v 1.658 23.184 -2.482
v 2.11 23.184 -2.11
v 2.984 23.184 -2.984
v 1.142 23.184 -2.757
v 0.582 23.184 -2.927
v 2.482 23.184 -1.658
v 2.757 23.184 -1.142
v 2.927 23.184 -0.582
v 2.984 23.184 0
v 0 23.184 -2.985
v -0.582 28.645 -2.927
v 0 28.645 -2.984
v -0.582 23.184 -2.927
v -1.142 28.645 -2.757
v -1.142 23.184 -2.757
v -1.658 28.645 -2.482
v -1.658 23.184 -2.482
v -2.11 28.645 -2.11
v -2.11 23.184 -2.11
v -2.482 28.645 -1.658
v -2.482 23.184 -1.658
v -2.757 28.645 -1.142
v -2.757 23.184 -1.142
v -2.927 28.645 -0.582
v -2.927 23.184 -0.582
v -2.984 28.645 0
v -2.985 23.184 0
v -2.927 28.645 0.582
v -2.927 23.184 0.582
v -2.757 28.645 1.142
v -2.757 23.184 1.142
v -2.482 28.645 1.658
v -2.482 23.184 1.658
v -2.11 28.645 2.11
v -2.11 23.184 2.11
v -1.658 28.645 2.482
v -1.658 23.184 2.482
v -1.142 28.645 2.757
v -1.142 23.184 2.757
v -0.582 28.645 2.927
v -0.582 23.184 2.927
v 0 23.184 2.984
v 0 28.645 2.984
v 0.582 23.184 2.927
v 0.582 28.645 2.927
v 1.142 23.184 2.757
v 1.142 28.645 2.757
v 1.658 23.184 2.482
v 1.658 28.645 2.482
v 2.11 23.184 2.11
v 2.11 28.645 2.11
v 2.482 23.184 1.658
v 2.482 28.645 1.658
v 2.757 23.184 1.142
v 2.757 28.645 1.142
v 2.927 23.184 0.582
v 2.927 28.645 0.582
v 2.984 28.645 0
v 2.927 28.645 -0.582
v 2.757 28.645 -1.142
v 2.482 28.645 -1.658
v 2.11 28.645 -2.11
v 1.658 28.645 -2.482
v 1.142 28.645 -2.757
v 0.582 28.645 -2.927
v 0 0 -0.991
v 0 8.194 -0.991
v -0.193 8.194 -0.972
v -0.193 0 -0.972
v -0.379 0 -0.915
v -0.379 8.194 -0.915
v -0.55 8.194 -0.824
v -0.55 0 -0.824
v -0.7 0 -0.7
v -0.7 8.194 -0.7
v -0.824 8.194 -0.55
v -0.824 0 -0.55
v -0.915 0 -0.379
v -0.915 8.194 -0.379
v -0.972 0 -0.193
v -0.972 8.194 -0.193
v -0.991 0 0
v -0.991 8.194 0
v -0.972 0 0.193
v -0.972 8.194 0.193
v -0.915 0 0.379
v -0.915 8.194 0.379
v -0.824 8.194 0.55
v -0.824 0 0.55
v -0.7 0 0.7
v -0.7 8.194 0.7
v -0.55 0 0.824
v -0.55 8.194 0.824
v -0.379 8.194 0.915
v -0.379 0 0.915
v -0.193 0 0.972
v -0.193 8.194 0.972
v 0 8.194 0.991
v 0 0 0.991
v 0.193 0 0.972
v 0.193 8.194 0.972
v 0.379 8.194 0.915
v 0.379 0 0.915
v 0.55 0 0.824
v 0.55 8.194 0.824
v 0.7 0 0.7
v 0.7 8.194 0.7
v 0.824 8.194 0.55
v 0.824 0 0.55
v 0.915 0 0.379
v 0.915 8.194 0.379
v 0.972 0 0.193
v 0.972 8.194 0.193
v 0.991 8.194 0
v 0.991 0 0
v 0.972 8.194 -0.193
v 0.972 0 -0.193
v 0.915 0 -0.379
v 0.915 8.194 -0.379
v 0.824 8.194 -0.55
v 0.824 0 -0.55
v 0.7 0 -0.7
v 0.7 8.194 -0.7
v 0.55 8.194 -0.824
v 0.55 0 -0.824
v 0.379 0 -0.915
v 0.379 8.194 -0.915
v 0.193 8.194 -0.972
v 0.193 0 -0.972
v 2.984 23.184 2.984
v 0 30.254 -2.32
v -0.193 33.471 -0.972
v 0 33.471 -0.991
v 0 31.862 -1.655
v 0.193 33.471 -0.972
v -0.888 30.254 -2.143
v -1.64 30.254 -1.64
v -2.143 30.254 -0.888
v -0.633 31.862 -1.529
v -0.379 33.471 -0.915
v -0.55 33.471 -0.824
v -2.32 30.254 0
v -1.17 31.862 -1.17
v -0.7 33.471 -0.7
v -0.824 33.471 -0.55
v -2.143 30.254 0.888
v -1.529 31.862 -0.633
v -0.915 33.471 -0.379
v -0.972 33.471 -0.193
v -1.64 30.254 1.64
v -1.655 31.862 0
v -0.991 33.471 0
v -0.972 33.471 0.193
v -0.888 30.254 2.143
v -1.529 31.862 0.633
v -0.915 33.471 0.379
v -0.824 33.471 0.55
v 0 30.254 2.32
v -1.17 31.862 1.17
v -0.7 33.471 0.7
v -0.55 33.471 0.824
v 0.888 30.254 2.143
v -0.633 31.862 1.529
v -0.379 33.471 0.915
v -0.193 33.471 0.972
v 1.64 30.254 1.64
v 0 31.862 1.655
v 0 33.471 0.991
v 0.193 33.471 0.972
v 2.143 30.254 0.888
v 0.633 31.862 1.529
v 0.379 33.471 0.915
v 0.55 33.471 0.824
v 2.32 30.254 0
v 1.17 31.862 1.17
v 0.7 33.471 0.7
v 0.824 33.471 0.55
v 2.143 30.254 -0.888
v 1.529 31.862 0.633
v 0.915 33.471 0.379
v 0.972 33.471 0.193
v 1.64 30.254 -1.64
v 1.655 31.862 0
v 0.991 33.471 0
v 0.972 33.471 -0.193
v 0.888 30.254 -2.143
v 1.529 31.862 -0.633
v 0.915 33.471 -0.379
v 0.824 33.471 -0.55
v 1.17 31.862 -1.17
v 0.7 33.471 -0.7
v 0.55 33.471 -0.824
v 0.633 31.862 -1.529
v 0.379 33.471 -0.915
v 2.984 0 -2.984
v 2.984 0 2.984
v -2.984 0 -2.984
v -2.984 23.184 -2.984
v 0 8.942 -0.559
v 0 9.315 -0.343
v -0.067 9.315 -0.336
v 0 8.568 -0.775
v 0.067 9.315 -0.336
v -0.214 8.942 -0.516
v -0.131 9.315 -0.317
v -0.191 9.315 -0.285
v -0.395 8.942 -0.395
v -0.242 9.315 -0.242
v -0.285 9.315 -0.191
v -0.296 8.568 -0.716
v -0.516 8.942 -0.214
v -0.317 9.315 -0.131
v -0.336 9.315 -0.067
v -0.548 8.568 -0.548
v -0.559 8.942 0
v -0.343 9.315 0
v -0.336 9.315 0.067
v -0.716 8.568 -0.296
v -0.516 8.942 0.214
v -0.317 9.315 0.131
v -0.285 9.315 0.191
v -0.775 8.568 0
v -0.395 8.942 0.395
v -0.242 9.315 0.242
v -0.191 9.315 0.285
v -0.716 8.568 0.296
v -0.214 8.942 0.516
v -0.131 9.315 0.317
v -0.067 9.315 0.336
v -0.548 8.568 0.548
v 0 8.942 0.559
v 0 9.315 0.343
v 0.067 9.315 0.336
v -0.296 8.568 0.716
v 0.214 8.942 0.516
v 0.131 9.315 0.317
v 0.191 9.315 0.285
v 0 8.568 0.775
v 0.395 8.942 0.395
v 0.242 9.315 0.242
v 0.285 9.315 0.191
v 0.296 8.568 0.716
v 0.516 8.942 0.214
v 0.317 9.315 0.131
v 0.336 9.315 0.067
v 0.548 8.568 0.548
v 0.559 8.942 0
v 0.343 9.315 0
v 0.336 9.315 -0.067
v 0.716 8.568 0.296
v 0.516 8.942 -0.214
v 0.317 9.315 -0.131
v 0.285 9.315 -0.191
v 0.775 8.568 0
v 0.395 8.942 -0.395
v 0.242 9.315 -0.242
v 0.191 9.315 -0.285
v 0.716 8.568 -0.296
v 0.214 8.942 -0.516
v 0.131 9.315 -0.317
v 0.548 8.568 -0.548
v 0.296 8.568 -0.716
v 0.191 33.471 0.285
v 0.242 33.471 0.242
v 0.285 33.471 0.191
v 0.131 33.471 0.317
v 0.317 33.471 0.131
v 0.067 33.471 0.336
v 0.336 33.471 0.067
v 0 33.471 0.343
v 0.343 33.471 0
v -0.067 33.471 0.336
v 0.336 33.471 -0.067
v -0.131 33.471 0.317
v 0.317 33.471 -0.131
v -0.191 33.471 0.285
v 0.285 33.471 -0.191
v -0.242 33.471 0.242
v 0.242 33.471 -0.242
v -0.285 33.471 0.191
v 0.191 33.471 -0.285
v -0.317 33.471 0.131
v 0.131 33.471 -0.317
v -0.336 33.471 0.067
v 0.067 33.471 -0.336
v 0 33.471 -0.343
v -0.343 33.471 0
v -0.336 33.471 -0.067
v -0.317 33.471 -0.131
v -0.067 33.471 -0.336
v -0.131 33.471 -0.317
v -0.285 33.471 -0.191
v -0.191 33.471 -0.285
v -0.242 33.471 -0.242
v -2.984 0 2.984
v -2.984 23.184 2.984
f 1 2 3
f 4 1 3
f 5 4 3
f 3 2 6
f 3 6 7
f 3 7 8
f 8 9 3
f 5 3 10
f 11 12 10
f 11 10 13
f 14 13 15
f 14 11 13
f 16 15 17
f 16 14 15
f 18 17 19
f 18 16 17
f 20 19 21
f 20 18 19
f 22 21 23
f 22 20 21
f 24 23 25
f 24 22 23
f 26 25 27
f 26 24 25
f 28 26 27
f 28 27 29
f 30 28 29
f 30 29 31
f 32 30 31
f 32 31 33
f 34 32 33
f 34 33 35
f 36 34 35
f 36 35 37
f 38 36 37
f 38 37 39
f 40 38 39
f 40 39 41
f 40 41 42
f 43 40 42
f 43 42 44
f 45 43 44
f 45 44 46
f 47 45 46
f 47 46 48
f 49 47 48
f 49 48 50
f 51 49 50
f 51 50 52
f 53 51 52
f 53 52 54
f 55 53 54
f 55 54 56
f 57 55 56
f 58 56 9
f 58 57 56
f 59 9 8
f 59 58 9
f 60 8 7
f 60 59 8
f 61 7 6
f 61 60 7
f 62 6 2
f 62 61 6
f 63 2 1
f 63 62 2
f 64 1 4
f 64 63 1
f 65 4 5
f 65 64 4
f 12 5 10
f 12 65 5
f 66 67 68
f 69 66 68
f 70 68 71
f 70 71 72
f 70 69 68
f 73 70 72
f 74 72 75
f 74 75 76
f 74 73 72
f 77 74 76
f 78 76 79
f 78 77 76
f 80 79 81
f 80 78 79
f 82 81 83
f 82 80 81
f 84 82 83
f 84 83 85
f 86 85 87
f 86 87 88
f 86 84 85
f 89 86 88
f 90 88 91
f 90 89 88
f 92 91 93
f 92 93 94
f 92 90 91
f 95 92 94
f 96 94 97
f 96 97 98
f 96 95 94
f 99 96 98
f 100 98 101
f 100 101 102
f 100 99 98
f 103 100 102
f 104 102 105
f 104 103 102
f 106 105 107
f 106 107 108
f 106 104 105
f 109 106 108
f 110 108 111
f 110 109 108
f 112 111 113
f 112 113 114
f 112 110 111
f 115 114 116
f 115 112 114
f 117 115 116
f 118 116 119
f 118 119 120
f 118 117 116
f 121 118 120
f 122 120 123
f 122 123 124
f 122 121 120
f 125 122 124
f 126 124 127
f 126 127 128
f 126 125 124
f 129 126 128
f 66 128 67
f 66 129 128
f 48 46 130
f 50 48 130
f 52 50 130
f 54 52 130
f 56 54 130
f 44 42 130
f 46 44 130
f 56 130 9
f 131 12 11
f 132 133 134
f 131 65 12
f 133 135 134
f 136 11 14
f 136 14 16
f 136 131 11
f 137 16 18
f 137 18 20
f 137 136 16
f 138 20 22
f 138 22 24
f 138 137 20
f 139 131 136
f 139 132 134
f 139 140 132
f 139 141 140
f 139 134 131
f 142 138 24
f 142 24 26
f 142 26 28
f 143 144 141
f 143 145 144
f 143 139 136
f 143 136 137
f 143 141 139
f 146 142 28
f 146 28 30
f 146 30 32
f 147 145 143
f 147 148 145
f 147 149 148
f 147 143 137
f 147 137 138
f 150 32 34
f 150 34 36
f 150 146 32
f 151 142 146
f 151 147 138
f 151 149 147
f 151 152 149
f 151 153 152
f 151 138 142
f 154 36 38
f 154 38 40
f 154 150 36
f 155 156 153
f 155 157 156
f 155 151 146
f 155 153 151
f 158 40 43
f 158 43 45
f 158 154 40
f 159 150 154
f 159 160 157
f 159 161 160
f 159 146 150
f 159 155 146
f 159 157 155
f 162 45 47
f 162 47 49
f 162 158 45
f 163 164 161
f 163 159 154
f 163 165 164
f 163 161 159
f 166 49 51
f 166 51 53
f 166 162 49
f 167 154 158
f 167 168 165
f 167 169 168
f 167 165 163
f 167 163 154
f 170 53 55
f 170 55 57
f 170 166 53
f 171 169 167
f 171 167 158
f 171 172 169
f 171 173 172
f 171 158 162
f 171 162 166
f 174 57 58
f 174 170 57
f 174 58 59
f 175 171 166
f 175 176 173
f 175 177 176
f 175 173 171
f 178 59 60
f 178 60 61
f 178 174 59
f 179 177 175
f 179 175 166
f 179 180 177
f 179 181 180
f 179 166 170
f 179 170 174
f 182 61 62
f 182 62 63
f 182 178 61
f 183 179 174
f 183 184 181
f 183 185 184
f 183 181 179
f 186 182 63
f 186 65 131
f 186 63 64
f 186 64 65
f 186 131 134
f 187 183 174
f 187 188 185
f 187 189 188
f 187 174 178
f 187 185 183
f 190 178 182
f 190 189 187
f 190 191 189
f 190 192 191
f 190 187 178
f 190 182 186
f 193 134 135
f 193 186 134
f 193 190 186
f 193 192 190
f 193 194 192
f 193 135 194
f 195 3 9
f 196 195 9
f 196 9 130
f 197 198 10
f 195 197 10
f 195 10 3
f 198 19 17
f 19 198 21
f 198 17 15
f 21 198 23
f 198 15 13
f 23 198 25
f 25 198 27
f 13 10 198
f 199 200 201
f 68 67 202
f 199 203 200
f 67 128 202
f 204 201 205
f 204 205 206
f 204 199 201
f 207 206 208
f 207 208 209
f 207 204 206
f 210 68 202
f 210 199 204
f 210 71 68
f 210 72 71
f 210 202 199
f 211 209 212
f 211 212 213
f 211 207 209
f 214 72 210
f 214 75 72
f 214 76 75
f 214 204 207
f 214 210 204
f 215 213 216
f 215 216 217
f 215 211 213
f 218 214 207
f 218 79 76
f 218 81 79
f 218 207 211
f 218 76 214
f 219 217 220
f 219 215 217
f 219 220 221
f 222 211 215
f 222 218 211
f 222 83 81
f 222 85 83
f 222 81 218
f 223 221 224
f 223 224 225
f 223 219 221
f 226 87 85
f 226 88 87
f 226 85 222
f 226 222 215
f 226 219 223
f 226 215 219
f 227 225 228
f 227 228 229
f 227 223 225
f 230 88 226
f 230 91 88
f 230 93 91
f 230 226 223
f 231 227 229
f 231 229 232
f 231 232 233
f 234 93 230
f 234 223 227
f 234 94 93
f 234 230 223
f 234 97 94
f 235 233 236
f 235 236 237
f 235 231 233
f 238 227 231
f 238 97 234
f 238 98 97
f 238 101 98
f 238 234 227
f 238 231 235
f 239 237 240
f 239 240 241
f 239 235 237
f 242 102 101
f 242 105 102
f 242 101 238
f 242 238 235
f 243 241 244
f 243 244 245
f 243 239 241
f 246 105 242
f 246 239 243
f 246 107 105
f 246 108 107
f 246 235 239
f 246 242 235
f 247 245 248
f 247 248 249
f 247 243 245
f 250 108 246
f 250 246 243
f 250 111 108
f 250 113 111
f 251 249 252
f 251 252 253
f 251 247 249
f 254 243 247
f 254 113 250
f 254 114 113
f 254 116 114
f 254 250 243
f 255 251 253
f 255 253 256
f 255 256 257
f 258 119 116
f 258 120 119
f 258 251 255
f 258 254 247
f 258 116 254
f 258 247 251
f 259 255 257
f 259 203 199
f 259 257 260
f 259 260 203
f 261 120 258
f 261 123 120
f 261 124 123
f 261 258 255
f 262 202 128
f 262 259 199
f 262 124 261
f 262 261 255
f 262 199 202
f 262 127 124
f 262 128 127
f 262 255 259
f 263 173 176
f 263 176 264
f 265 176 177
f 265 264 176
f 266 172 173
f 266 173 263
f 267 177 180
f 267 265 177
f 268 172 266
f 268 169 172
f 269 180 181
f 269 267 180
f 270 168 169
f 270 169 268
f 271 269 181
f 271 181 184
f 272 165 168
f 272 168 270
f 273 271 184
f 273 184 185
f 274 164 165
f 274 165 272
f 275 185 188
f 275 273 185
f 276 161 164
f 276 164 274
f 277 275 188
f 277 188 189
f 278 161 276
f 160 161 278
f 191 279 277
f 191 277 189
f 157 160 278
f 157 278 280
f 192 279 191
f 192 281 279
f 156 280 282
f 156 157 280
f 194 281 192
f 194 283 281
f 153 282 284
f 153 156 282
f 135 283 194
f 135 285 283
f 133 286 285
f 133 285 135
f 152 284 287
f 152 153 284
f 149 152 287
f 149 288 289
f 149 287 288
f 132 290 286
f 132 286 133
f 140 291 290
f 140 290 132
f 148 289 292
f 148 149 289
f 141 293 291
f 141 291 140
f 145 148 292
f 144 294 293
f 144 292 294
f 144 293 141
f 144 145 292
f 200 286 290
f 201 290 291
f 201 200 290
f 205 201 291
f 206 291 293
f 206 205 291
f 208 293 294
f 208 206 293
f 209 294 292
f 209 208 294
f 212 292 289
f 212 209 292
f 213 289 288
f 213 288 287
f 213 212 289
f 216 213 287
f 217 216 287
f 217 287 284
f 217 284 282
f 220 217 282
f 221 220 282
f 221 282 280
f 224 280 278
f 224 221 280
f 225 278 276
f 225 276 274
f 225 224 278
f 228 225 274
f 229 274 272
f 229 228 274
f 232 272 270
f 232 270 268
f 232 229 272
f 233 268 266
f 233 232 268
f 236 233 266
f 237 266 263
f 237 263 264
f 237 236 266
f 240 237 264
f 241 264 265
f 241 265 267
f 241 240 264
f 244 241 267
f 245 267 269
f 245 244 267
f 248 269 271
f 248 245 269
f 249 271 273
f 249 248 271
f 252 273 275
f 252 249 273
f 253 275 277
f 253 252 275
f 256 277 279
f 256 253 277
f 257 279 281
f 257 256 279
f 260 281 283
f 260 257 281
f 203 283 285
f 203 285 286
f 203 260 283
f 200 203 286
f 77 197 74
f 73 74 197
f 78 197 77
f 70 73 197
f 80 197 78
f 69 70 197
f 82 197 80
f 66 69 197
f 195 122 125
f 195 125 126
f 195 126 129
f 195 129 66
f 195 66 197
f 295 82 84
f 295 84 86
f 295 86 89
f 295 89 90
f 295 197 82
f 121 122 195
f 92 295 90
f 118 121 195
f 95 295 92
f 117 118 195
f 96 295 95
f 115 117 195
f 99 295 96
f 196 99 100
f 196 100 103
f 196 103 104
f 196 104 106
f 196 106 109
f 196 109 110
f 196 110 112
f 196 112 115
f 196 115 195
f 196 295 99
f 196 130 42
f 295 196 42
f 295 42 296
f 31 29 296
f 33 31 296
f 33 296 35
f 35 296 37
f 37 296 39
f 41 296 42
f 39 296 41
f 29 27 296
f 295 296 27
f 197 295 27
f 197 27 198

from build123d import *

# Parameters (mm, degrees)
BOSS_EXTRUDE2_START = -23.18385
BOSS_EXTRUDE2_DEPTH = 23.18385


with BuildPart() as part:
    # Sketch1 → Revolve1 (revolve)
    with BuildSketch(Plane.XY, mode=Mode.PRIVATE) as revolve1_sk:
        Polygon((-0.9906, 0), (-2.9845, 0), (-2.9845, 28.64485), (-0.9906, 33.47085), (-0.3429, 33.47085), (-0.3429, 9.31545), (-0.9906, 8.193600692), align=None)
    revolve(revolve1_sk.sketch.rotate(Axis((0, 0, 0), (0, 1, 0)), 270), axis=Axis((0, 0, 0), (0, 1, 0)))

    # Sketch2 → Boss-Extrude2 (add)
    with BuildSketch(Plane.XZ.offset(BOSS_EXTRUDE2_START)):
        with BuildLine():
            Line((2.9845, 2.9845), (-1e-09, 2.9845))
            ThreePointArc((-1e-09, 2.9845), (2.110360188, 2.110360189), (2.9845, 0))
            Line((2.9845, 0), (2.9845, 2.9845))
        make_face()
        with BuildLine():
            Line((-1e-09, 2.9845), (-2.9845, 2.9845))
            Line((-2.9845, 2.9845), (-2.9845, 5e-09))
            ThreePointArc((-2.9845, 5e-09), (-2.110360187, 2.11036019), (-1e-09, 2.9845))
        make_face()
        with BuildLine():
            Line((2.9845, -2.9845), (2.9845, 0))
            ThreePointArc((2.9845, 0), (2.110360188, -2.110360189), (-2e-09, -2.9845))
            Line((-2e-09, -2.9845), (2.9845, -2.9845))
        make_face()
        with BuildLine():
            ThreePointArc((-2e-09, -2.9845), (-2.110360191, -2.110360186), (-2.9845, 5e-09))
            Line((-2.9845, 5e-09), (-2.9845, -2.9845))
            Line((-2.9845, -2.9845), (-2e-09, -2.9845))
        make_face()
    extrude(amount=BOSS_EXTRUDE2_DEPTH)


solid = part.part
